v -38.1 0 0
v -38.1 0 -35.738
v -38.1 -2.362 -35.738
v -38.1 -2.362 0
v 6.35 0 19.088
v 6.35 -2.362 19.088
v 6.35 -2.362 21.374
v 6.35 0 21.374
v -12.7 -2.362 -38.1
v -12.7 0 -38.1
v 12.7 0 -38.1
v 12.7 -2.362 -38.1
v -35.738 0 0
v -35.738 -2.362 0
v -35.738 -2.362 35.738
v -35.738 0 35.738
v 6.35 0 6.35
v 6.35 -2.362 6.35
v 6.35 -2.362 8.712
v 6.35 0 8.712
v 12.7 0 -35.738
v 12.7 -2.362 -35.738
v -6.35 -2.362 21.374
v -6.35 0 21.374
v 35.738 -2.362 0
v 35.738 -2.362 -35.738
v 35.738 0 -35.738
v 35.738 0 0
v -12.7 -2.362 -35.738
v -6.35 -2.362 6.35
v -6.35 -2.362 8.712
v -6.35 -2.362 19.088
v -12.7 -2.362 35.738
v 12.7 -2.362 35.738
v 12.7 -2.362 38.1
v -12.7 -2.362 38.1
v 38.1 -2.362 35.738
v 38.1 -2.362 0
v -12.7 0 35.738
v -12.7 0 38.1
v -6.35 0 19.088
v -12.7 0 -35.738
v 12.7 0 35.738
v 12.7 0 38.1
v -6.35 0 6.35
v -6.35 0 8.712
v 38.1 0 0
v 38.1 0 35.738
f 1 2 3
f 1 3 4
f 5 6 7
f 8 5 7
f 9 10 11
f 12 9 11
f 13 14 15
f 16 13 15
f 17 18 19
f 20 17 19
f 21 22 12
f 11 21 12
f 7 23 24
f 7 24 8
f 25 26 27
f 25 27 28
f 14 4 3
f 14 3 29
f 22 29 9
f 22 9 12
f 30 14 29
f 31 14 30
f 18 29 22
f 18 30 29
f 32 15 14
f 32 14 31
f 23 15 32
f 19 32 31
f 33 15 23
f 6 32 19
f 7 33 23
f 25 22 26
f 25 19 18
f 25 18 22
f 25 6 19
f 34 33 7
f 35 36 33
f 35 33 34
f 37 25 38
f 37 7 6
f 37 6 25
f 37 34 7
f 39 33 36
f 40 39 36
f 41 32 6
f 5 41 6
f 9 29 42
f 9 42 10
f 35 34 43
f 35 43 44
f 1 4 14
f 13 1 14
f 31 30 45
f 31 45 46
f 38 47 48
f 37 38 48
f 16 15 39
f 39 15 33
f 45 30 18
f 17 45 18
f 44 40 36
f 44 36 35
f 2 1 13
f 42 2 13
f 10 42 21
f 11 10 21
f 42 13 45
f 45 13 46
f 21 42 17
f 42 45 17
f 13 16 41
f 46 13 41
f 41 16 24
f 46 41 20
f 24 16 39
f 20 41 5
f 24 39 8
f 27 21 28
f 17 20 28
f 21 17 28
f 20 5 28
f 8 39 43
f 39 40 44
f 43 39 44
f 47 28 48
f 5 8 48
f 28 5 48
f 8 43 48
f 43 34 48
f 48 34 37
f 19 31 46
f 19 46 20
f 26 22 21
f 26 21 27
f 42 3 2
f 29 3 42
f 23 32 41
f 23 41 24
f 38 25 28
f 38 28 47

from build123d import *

# Parameters (mm, degrees)
F0_W     = 76.2
F0_H     = 76.2
F1_DEPTH = 2.3622
F2_W     = 25.4
F2_H     = 2.3622
F3_DEPTH = 2.3632
F4_W     = 2.3622
F4_H     = 35.7378
F5_DEPTH = 25.4
F6_W     = 12.7
F6_H     = 2.286
F6_H_2   = 2.3622
F7_DEPTH = 25.4


# Not quite as in the source:
# - a pattern or mirror of a feature is missing from the dataset's text; its kind, count and spacing are read off the source's solid


with BuildPart() as f1:
    # F0 (on Front) → F1 (new body)
    with BuildSketch(Plane.XZ):
        Rectangle(F0_W, F0_H)
    extrude(amount=F1_DEPTH)

    # F2 (on face) → F3 (cut, through all)
    with BuildSketch(Plane.XZ.offset(2.3622)):
        with Locations((-25.4, 36.9189)):
            Rectangle(F2_W, F2_H)
        with Locations((25.4, 36.9189)):
            Rectangle(F2_W, F2_H)
    f3 = extrude(amount=-F3_DEPTH, mode=Mode.SUBTRACT)

    # F3_copies: F3 across plane
    add(f3.mirror(Plane(origin=(0, 0, 0), x_dir=(-1, 0, 0), z_dir=(0, 0, -1))), mode=Mode.SUBTRACT)

    # F4 (on face) → F5 (cut)
    with BuildSketch(Plane.XZ.offset(2.3622)):
        with Locations((-36.9189, 17.8689)):
            Rectangle(F4_W, F4_H)
        with Locations((36.9189, -17.8689)):
            Rectangle(F4_W, F4_H)
    extrude(amount=-F5_DEPTH, mode=Mode.SUBTRACT)

    # F6 (on face) → F7 (cut)
    with BuildSketch(Plane.XZ.offset(2.3622)):
        with Locations((0, 20.2311)):
            Rectangle(F6_W, F6_H)
        with Locations((0, 7.5311)):
            Rectangle(F6_W, F6_H_2)
    extrude(amount=-F7_DEPTH, mode=Mode.SUBTRACT)


solid = f1.part
